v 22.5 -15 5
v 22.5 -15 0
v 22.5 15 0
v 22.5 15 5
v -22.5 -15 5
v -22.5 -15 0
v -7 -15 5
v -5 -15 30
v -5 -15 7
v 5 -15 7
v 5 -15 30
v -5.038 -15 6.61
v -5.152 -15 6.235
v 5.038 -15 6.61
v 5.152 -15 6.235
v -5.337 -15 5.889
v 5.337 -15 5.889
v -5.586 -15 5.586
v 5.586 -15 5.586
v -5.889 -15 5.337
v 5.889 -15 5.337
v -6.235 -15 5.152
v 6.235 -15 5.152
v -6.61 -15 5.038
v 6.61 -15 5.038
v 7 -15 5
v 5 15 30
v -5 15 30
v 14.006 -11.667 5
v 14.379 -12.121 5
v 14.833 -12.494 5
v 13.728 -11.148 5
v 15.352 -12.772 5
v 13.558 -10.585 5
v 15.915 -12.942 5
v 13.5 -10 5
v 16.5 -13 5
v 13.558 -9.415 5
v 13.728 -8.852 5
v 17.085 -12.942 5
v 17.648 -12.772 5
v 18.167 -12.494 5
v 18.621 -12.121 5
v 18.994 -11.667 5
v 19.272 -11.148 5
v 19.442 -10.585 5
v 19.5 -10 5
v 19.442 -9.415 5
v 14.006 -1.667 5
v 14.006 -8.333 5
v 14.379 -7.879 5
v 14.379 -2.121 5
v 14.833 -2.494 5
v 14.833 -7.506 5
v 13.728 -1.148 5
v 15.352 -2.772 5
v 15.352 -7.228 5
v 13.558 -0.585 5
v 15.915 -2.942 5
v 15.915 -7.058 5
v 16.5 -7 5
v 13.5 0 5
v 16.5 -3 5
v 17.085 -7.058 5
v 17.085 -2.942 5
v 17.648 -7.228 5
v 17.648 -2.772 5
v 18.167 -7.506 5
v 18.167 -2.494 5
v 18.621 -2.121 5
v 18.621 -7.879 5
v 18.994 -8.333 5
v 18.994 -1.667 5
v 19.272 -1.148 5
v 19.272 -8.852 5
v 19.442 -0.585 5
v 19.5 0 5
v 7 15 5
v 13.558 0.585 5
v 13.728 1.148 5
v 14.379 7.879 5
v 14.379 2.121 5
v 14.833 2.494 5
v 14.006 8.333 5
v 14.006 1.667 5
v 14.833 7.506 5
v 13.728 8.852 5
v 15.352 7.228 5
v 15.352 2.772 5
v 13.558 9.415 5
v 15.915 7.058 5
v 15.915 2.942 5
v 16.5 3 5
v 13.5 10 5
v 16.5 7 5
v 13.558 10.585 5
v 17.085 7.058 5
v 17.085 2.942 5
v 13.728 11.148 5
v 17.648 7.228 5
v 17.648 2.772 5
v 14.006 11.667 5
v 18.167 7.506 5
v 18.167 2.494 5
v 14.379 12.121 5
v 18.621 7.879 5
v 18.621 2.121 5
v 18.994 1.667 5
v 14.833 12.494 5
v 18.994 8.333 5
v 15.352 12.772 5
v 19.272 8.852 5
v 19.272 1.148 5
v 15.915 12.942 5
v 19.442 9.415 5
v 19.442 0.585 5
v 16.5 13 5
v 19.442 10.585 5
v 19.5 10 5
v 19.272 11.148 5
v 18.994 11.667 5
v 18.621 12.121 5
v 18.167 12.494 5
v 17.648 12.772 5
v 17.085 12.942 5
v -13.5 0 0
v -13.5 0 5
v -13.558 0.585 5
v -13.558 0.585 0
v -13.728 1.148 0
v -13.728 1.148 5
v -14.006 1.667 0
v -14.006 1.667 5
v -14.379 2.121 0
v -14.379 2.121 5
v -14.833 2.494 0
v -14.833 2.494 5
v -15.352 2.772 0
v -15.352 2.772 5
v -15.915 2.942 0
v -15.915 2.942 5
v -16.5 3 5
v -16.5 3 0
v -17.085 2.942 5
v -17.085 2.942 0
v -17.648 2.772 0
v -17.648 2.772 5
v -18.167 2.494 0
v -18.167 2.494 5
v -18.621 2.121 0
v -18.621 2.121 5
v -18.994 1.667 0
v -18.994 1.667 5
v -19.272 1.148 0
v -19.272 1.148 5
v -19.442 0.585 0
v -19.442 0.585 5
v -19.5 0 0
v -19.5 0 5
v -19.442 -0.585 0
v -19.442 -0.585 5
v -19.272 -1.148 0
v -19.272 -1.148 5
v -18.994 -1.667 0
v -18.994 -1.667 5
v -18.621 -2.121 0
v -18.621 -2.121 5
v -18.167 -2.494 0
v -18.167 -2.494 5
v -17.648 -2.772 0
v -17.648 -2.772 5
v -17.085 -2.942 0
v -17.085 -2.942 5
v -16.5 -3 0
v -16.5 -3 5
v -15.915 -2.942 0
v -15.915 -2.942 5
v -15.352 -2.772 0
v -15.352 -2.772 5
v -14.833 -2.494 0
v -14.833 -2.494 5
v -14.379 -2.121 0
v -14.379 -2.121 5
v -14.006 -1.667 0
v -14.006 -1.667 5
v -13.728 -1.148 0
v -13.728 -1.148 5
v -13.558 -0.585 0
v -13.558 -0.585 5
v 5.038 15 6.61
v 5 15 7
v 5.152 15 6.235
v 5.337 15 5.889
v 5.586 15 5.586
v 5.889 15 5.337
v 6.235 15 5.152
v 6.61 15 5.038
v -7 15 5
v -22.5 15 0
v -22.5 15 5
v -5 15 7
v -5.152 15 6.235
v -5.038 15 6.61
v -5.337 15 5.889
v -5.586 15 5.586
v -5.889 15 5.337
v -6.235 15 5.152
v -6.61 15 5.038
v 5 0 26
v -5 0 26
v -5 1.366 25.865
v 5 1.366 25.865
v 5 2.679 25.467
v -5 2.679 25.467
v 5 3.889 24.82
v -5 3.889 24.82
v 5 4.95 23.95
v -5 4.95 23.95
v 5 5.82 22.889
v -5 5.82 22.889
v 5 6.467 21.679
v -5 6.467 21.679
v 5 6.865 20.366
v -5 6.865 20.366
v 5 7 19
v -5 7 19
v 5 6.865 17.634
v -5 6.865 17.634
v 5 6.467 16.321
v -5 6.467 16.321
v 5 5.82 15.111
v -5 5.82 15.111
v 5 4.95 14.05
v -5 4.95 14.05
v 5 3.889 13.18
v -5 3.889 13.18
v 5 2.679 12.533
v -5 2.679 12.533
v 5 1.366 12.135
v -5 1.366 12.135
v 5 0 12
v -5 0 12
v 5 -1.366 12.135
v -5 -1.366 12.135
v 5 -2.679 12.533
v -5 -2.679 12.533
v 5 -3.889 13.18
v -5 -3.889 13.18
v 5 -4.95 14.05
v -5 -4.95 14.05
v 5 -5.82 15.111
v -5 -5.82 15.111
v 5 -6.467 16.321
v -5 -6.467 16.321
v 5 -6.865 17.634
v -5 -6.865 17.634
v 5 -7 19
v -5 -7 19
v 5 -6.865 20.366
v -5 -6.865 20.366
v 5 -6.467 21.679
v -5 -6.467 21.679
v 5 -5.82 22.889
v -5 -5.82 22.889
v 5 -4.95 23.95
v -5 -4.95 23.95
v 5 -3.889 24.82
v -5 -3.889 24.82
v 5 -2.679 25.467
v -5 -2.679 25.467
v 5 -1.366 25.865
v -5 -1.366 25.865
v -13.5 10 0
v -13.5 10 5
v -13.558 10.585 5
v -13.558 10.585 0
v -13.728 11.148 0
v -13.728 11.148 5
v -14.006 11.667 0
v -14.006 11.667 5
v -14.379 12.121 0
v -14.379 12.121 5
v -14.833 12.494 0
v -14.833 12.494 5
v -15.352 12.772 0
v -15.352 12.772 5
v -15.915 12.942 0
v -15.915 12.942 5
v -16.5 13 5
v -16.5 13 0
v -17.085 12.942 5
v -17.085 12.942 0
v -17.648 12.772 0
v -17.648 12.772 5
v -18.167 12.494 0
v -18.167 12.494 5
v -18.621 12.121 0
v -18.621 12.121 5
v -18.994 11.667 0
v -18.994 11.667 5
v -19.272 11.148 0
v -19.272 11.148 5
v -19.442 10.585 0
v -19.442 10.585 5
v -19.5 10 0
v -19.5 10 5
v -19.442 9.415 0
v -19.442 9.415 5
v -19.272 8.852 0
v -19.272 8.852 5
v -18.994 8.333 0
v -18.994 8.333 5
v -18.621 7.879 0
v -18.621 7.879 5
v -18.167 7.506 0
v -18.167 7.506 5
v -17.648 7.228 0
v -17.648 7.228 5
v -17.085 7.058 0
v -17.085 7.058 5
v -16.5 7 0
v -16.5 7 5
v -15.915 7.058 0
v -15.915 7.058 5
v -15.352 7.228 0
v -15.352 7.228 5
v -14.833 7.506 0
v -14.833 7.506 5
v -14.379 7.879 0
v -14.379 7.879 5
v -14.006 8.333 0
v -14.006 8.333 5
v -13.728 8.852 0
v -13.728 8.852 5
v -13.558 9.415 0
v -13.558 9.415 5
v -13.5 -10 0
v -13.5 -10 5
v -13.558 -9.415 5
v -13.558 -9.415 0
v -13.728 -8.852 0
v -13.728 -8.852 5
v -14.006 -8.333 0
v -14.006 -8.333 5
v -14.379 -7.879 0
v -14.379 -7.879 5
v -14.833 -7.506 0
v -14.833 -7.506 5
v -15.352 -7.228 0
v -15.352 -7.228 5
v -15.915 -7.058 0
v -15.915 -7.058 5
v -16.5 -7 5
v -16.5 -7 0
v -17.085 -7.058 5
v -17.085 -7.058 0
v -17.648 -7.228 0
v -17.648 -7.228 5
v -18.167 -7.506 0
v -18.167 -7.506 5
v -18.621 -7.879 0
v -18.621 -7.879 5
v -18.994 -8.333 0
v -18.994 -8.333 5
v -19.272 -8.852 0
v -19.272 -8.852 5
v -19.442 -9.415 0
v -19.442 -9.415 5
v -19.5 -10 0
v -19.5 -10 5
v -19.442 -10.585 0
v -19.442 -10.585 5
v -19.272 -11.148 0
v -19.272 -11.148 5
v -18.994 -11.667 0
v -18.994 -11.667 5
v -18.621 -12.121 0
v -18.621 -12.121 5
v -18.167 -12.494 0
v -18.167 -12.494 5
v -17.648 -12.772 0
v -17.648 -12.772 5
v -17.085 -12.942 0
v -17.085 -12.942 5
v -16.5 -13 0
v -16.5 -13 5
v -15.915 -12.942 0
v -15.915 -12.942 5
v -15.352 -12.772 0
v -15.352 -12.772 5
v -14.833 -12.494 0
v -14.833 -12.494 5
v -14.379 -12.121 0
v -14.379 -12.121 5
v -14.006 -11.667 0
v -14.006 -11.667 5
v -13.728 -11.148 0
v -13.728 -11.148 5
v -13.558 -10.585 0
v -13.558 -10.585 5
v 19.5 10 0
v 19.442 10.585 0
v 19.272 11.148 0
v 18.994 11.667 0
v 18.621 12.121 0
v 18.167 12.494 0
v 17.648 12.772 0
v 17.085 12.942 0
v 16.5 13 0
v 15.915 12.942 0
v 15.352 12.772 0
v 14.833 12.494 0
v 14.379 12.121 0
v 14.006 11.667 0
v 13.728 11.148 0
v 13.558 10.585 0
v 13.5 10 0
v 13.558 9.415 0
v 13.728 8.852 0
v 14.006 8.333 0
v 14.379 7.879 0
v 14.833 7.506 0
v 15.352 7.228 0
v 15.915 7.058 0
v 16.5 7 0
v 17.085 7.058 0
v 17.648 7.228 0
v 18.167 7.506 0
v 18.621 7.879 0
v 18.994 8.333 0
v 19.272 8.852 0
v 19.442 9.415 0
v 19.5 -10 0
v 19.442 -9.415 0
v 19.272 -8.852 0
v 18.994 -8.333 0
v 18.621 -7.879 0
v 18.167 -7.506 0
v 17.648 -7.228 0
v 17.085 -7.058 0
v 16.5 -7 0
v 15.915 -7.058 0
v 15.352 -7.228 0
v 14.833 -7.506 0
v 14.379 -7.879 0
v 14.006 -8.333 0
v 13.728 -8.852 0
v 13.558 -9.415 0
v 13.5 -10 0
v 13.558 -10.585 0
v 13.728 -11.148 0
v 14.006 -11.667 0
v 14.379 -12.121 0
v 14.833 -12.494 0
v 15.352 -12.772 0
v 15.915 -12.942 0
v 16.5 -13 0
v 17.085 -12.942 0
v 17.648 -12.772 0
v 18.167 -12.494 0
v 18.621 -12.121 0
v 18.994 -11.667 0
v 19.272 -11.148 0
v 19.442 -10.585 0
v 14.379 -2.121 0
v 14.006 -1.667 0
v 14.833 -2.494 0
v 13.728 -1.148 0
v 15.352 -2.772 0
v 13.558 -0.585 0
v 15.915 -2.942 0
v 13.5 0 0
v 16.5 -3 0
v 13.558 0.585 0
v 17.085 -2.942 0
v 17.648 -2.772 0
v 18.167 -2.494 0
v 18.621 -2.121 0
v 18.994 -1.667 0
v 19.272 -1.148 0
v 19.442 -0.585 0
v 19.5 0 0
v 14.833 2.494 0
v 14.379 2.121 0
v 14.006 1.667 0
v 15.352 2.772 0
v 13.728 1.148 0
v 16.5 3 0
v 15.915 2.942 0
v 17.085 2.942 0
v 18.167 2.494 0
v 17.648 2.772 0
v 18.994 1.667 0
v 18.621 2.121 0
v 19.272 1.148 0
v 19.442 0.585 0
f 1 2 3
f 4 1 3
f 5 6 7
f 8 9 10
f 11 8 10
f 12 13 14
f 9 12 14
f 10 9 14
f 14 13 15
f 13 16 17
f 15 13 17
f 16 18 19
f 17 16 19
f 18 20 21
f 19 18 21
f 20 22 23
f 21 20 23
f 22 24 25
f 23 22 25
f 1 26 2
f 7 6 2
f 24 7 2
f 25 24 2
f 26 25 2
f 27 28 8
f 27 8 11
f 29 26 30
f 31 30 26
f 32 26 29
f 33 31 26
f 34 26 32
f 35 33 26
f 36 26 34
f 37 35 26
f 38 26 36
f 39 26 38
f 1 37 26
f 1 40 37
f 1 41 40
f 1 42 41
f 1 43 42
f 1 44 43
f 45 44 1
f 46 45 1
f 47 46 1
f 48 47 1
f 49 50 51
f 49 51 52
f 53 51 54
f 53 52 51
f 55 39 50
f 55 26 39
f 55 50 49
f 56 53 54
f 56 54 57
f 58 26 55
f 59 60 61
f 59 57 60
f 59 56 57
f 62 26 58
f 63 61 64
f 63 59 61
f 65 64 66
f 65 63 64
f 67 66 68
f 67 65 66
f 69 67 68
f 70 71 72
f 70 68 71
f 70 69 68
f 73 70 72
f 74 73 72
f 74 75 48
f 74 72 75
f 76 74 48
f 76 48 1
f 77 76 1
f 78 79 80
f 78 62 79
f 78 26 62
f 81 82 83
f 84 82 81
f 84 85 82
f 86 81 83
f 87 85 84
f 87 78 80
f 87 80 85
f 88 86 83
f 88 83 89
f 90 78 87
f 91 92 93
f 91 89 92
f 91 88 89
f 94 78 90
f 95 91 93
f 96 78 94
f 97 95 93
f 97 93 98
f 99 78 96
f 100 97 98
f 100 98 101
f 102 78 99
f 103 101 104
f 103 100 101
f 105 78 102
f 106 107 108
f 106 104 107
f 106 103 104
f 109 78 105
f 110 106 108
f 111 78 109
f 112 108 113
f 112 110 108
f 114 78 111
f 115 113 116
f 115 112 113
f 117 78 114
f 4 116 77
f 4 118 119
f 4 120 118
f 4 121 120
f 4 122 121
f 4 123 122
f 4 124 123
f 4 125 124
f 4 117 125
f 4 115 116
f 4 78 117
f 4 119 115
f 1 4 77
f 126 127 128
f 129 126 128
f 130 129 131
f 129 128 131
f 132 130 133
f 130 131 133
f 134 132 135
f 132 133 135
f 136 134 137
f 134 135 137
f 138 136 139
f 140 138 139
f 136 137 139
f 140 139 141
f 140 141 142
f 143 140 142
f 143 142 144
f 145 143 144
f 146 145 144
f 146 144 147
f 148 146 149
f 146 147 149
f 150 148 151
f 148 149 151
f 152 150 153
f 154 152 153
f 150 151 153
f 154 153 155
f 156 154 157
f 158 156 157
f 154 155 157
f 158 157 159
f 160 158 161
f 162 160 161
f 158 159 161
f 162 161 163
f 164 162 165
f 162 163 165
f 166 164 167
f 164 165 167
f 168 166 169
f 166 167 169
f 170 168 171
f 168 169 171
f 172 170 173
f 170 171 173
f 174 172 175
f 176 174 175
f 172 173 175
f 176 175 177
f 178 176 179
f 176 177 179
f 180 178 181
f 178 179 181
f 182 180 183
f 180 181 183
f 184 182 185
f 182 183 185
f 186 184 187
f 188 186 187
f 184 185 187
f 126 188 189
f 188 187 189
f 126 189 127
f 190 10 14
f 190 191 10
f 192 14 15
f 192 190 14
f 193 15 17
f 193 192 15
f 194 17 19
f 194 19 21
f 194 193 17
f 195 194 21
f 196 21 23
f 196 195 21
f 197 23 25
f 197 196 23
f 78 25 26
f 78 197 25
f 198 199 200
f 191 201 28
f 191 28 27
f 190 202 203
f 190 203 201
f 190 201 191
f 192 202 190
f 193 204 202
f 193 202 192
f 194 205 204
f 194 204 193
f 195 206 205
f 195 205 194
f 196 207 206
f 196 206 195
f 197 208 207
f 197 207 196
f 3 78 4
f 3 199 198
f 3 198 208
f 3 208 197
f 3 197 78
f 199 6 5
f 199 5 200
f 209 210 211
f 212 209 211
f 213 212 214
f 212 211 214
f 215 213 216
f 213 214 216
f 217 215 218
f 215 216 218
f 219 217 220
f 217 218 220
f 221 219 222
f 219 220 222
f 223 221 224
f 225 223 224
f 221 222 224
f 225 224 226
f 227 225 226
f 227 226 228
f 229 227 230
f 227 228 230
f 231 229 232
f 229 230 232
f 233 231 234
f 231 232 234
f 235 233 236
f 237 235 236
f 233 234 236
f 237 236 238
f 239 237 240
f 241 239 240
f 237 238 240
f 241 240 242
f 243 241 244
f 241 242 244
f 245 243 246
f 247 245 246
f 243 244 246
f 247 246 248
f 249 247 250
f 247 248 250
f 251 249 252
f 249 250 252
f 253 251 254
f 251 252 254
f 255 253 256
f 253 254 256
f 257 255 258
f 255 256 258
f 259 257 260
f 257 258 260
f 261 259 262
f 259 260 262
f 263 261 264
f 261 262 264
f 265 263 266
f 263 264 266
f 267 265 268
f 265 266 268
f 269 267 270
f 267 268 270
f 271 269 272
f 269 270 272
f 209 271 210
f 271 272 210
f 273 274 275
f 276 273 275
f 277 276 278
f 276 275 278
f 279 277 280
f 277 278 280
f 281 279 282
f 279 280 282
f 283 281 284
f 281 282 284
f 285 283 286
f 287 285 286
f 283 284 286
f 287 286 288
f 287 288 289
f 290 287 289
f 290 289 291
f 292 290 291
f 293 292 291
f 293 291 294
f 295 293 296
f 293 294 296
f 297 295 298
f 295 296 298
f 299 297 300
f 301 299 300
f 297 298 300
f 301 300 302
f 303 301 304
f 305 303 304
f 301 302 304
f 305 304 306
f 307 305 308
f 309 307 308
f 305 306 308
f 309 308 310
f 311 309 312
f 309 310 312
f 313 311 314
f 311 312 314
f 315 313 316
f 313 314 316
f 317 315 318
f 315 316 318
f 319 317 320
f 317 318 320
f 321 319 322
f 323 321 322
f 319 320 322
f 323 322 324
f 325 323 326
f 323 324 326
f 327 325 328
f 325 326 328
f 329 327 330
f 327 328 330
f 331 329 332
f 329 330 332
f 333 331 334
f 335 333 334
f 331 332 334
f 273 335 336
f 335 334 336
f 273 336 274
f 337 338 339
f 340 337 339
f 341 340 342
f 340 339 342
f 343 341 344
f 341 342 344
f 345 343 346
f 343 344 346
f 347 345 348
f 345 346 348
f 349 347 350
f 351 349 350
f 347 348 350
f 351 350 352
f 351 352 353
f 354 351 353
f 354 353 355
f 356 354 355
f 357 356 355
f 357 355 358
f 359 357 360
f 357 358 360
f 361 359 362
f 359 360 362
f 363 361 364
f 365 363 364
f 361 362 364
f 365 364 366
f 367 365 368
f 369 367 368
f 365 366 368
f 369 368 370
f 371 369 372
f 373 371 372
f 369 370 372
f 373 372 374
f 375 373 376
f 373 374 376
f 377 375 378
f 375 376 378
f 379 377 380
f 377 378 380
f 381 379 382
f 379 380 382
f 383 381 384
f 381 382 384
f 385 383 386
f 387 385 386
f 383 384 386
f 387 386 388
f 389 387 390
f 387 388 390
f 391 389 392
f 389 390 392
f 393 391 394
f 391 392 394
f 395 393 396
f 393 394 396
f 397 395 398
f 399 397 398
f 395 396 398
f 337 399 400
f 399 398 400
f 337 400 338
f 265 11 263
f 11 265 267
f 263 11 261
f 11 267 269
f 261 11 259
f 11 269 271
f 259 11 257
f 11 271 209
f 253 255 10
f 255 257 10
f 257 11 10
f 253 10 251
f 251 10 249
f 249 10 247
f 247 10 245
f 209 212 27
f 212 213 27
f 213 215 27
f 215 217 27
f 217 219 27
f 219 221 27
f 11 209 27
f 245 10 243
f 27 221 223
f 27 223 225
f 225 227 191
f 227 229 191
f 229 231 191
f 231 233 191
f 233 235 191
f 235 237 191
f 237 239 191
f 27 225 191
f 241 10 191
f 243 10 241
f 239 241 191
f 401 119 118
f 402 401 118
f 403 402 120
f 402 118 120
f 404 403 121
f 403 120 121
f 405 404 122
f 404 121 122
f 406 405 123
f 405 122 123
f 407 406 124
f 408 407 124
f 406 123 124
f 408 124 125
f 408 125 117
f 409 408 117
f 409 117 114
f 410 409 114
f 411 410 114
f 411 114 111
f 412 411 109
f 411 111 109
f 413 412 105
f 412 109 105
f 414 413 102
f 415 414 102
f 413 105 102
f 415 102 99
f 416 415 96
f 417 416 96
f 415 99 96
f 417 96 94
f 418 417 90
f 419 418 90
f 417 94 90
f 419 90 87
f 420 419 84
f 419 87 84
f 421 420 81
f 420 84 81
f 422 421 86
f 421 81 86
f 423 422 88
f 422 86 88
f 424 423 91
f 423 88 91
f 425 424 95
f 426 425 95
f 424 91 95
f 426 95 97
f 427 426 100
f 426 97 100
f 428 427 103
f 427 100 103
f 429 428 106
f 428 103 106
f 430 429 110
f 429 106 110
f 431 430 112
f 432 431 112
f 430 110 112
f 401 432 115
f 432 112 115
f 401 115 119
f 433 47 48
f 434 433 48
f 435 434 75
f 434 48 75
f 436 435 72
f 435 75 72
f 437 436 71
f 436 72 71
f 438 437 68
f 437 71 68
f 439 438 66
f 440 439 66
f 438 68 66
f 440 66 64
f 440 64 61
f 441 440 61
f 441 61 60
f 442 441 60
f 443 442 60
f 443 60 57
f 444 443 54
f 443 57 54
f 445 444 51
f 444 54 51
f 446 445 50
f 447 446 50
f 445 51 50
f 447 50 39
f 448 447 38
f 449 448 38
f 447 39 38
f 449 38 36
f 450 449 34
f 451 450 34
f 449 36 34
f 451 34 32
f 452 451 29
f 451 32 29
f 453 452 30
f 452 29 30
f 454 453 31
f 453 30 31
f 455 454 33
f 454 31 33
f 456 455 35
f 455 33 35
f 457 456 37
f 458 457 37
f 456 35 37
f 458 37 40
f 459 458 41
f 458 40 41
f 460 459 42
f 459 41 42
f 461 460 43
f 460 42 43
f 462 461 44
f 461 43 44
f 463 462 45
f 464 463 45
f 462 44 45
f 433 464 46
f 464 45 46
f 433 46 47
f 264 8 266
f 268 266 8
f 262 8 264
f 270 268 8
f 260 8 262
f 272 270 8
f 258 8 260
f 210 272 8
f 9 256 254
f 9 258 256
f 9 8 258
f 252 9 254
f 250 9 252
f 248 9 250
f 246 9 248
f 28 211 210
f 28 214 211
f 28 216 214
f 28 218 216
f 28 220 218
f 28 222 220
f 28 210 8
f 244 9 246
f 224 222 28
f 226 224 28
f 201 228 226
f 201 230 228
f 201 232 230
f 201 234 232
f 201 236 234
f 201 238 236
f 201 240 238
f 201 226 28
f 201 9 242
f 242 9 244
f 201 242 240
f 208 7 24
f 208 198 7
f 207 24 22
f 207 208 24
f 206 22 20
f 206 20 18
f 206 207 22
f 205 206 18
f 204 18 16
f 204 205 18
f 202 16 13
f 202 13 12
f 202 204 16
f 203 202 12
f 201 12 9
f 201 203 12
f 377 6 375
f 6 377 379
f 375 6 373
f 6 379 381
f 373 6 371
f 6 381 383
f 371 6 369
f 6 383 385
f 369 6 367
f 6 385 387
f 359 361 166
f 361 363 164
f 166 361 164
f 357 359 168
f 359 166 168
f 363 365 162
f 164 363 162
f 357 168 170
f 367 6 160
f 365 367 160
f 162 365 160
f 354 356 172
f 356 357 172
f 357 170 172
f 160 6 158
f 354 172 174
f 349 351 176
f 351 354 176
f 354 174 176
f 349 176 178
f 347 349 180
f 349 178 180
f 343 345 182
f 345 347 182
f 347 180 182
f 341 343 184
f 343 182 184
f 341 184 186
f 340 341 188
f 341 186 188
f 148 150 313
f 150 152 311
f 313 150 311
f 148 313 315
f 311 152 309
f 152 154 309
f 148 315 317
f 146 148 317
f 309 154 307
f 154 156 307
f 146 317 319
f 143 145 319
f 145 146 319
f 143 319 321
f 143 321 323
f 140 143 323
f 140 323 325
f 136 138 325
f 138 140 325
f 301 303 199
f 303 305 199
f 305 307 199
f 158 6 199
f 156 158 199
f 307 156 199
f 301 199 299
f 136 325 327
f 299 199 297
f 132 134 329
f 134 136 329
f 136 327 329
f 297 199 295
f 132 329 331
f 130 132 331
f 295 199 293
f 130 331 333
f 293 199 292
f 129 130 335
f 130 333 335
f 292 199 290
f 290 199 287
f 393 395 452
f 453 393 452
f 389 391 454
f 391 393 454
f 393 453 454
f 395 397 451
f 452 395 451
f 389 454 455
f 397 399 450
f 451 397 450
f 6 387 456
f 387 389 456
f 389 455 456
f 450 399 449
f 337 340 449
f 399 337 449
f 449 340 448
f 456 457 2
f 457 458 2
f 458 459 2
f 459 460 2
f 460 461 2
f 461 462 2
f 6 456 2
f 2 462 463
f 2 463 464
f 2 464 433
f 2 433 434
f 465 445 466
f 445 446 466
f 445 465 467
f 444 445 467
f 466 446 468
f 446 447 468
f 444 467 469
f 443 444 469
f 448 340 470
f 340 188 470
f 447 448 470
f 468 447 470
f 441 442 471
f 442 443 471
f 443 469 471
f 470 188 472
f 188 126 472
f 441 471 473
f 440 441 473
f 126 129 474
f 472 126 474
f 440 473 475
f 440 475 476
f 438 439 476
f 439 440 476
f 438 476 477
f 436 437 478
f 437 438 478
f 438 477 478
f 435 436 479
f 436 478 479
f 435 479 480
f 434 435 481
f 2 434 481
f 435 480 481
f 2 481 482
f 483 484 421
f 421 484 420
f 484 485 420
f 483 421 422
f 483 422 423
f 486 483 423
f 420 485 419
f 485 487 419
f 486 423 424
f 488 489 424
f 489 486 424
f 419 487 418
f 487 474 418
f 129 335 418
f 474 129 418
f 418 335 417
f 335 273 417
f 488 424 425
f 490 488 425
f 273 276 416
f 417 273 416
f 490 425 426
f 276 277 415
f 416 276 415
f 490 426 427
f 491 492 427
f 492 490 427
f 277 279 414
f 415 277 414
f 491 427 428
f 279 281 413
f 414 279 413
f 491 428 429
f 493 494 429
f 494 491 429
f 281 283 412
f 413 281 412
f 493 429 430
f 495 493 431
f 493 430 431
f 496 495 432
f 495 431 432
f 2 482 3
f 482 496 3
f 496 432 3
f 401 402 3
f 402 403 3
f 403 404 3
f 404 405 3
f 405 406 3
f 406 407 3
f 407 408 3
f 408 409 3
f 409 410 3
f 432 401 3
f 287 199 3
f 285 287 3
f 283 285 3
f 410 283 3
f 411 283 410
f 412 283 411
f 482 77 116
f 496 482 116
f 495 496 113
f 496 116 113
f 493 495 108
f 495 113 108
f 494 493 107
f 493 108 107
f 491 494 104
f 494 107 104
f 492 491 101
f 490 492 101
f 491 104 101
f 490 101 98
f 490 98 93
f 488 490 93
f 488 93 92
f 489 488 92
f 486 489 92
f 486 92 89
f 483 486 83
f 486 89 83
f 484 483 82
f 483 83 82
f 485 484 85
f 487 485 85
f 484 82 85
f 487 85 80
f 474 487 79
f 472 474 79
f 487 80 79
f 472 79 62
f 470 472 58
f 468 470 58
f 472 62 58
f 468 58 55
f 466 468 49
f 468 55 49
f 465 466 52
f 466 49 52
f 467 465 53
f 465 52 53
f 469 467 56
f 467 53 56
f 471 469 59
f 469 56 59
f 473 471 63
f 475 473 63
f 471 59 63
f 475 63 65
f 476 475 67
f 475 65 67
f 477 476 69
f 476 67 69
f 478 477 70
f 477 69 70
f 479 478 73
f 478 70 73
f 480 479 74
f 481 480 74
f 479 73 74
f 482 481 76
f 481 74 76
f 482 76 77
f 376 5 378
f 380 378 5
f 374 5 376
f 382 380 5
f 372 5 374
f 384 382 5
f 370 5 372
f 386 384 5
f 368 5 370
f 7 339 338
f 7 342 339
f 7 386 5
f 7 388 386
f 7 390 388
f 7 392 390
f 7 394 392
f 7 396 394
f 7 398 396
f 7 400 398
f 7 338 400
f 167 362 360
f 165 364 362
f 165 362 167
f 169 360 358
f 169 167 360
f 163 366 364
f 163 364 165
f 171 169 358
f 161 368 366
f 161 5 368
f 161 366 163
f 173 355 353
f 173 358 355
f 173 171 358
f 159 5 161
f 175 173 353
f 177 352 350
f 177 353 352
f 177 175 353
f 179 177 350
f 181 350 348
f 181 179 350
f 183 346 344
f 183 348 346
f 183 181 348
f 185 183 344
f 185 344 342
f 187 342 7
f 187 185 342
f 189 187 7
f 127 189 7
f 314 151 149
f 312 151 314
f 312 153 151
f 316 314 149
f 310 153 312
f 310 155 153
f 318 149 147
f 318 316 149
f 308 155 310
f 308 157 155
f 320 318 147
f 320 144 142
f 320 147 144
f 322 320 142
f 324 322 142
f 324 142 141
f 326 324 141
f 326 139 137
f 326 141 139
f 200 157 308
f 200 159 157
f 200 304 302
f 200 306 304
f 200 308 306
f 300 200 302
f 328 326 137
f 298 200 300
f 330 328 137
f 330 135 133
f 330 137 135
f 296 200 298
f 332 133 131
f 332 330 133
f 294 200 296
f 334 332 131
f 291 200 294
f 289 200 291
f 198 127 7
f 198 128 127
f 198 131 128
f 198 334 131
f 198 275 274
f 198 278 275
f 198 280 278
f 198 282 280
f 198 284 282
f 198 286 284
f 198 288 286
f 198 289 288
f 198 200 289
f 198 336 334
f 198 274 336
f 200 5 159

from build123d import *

# Parameters (mm, degrees)
SKETCH1_W           = 45
SKETCH1_H           = 30
BASE_DEPTH          = 5
SKETCH2_W           = 10
SKETCH2_H           = 30
BOSS_EXTRUDE2_DEPTH = 25
SKETCH3_R           = 7
CUT_EXTRUDE3_DEPTH  = 10
SKETCH9_R           = 3
SCREW_DEPTH         = 5
FILLET1_R           = 2
FILLET2_R           = 2


with BuildPart() as part:
    # Sketch1 → Base (new body)
    with BuildSketch(Plane.XY):
        Rectangle(SKETCH1_W, SKETCH1_H)
    extrude(amount=BASE_DEPTH)

    # Sketch2 → Boss-Extrude2 (add)
    with BuildSketch(Plane.XY.offset(5)):
        Rectangle(SKETCH2_W, SKETCH2_H)
    extrude(amount=BOSS_EXTRUDE2_DEPTH)

    # Sketch3 → Cut-Extrude3 (cut)
    with BuildSketch(Plane.ZY.offset(5)):
        with Locations((19, 0)):
            Circle(SKETCH3_R)
    extrude(amount=-CUT_EXTRUDE3_DEPTH, mode=Mode.SUBTRACT)

    # Sketch9 → Screw (cut)
    with BuildSketch(Plane.XY.offset(5)):
        with Locations((-16.5, 10)):
            Circle(SKETCH9_R)
        with Locations((-16.5, 0)):
            Circle(SKETCH9_R)
        with Locations((-16.5, -10)):
            Circle(SKETCH9_R)
        with Locations((16.5, -10)):
            Circle(SKETCH9_R)
        with Locations((16.5, 0)):
            Circle(SKETCH9_R)
        with Locations((16.5, 10)):
            Circle(SKETCH9_R)
    extrude(amount=-SCREW_DEPTH, mode=Mode.SUBTRACT)

    # Fillet1
    fillet1_edges = [part.edges().sort_by_distance(p)[0] for p in [
        (-5, 0, 5),
    ]]
    fillet(fillet1_edges, radius=FILLET1_R)

    # Fillet2
    fillet2_edges = [part.edges().sort_by_distance(p)[0] for p in [
        (5, 0, 5),
    ]]
    fillet(fillet2_edges, radius=FILLET2_R)


solid = part.part
